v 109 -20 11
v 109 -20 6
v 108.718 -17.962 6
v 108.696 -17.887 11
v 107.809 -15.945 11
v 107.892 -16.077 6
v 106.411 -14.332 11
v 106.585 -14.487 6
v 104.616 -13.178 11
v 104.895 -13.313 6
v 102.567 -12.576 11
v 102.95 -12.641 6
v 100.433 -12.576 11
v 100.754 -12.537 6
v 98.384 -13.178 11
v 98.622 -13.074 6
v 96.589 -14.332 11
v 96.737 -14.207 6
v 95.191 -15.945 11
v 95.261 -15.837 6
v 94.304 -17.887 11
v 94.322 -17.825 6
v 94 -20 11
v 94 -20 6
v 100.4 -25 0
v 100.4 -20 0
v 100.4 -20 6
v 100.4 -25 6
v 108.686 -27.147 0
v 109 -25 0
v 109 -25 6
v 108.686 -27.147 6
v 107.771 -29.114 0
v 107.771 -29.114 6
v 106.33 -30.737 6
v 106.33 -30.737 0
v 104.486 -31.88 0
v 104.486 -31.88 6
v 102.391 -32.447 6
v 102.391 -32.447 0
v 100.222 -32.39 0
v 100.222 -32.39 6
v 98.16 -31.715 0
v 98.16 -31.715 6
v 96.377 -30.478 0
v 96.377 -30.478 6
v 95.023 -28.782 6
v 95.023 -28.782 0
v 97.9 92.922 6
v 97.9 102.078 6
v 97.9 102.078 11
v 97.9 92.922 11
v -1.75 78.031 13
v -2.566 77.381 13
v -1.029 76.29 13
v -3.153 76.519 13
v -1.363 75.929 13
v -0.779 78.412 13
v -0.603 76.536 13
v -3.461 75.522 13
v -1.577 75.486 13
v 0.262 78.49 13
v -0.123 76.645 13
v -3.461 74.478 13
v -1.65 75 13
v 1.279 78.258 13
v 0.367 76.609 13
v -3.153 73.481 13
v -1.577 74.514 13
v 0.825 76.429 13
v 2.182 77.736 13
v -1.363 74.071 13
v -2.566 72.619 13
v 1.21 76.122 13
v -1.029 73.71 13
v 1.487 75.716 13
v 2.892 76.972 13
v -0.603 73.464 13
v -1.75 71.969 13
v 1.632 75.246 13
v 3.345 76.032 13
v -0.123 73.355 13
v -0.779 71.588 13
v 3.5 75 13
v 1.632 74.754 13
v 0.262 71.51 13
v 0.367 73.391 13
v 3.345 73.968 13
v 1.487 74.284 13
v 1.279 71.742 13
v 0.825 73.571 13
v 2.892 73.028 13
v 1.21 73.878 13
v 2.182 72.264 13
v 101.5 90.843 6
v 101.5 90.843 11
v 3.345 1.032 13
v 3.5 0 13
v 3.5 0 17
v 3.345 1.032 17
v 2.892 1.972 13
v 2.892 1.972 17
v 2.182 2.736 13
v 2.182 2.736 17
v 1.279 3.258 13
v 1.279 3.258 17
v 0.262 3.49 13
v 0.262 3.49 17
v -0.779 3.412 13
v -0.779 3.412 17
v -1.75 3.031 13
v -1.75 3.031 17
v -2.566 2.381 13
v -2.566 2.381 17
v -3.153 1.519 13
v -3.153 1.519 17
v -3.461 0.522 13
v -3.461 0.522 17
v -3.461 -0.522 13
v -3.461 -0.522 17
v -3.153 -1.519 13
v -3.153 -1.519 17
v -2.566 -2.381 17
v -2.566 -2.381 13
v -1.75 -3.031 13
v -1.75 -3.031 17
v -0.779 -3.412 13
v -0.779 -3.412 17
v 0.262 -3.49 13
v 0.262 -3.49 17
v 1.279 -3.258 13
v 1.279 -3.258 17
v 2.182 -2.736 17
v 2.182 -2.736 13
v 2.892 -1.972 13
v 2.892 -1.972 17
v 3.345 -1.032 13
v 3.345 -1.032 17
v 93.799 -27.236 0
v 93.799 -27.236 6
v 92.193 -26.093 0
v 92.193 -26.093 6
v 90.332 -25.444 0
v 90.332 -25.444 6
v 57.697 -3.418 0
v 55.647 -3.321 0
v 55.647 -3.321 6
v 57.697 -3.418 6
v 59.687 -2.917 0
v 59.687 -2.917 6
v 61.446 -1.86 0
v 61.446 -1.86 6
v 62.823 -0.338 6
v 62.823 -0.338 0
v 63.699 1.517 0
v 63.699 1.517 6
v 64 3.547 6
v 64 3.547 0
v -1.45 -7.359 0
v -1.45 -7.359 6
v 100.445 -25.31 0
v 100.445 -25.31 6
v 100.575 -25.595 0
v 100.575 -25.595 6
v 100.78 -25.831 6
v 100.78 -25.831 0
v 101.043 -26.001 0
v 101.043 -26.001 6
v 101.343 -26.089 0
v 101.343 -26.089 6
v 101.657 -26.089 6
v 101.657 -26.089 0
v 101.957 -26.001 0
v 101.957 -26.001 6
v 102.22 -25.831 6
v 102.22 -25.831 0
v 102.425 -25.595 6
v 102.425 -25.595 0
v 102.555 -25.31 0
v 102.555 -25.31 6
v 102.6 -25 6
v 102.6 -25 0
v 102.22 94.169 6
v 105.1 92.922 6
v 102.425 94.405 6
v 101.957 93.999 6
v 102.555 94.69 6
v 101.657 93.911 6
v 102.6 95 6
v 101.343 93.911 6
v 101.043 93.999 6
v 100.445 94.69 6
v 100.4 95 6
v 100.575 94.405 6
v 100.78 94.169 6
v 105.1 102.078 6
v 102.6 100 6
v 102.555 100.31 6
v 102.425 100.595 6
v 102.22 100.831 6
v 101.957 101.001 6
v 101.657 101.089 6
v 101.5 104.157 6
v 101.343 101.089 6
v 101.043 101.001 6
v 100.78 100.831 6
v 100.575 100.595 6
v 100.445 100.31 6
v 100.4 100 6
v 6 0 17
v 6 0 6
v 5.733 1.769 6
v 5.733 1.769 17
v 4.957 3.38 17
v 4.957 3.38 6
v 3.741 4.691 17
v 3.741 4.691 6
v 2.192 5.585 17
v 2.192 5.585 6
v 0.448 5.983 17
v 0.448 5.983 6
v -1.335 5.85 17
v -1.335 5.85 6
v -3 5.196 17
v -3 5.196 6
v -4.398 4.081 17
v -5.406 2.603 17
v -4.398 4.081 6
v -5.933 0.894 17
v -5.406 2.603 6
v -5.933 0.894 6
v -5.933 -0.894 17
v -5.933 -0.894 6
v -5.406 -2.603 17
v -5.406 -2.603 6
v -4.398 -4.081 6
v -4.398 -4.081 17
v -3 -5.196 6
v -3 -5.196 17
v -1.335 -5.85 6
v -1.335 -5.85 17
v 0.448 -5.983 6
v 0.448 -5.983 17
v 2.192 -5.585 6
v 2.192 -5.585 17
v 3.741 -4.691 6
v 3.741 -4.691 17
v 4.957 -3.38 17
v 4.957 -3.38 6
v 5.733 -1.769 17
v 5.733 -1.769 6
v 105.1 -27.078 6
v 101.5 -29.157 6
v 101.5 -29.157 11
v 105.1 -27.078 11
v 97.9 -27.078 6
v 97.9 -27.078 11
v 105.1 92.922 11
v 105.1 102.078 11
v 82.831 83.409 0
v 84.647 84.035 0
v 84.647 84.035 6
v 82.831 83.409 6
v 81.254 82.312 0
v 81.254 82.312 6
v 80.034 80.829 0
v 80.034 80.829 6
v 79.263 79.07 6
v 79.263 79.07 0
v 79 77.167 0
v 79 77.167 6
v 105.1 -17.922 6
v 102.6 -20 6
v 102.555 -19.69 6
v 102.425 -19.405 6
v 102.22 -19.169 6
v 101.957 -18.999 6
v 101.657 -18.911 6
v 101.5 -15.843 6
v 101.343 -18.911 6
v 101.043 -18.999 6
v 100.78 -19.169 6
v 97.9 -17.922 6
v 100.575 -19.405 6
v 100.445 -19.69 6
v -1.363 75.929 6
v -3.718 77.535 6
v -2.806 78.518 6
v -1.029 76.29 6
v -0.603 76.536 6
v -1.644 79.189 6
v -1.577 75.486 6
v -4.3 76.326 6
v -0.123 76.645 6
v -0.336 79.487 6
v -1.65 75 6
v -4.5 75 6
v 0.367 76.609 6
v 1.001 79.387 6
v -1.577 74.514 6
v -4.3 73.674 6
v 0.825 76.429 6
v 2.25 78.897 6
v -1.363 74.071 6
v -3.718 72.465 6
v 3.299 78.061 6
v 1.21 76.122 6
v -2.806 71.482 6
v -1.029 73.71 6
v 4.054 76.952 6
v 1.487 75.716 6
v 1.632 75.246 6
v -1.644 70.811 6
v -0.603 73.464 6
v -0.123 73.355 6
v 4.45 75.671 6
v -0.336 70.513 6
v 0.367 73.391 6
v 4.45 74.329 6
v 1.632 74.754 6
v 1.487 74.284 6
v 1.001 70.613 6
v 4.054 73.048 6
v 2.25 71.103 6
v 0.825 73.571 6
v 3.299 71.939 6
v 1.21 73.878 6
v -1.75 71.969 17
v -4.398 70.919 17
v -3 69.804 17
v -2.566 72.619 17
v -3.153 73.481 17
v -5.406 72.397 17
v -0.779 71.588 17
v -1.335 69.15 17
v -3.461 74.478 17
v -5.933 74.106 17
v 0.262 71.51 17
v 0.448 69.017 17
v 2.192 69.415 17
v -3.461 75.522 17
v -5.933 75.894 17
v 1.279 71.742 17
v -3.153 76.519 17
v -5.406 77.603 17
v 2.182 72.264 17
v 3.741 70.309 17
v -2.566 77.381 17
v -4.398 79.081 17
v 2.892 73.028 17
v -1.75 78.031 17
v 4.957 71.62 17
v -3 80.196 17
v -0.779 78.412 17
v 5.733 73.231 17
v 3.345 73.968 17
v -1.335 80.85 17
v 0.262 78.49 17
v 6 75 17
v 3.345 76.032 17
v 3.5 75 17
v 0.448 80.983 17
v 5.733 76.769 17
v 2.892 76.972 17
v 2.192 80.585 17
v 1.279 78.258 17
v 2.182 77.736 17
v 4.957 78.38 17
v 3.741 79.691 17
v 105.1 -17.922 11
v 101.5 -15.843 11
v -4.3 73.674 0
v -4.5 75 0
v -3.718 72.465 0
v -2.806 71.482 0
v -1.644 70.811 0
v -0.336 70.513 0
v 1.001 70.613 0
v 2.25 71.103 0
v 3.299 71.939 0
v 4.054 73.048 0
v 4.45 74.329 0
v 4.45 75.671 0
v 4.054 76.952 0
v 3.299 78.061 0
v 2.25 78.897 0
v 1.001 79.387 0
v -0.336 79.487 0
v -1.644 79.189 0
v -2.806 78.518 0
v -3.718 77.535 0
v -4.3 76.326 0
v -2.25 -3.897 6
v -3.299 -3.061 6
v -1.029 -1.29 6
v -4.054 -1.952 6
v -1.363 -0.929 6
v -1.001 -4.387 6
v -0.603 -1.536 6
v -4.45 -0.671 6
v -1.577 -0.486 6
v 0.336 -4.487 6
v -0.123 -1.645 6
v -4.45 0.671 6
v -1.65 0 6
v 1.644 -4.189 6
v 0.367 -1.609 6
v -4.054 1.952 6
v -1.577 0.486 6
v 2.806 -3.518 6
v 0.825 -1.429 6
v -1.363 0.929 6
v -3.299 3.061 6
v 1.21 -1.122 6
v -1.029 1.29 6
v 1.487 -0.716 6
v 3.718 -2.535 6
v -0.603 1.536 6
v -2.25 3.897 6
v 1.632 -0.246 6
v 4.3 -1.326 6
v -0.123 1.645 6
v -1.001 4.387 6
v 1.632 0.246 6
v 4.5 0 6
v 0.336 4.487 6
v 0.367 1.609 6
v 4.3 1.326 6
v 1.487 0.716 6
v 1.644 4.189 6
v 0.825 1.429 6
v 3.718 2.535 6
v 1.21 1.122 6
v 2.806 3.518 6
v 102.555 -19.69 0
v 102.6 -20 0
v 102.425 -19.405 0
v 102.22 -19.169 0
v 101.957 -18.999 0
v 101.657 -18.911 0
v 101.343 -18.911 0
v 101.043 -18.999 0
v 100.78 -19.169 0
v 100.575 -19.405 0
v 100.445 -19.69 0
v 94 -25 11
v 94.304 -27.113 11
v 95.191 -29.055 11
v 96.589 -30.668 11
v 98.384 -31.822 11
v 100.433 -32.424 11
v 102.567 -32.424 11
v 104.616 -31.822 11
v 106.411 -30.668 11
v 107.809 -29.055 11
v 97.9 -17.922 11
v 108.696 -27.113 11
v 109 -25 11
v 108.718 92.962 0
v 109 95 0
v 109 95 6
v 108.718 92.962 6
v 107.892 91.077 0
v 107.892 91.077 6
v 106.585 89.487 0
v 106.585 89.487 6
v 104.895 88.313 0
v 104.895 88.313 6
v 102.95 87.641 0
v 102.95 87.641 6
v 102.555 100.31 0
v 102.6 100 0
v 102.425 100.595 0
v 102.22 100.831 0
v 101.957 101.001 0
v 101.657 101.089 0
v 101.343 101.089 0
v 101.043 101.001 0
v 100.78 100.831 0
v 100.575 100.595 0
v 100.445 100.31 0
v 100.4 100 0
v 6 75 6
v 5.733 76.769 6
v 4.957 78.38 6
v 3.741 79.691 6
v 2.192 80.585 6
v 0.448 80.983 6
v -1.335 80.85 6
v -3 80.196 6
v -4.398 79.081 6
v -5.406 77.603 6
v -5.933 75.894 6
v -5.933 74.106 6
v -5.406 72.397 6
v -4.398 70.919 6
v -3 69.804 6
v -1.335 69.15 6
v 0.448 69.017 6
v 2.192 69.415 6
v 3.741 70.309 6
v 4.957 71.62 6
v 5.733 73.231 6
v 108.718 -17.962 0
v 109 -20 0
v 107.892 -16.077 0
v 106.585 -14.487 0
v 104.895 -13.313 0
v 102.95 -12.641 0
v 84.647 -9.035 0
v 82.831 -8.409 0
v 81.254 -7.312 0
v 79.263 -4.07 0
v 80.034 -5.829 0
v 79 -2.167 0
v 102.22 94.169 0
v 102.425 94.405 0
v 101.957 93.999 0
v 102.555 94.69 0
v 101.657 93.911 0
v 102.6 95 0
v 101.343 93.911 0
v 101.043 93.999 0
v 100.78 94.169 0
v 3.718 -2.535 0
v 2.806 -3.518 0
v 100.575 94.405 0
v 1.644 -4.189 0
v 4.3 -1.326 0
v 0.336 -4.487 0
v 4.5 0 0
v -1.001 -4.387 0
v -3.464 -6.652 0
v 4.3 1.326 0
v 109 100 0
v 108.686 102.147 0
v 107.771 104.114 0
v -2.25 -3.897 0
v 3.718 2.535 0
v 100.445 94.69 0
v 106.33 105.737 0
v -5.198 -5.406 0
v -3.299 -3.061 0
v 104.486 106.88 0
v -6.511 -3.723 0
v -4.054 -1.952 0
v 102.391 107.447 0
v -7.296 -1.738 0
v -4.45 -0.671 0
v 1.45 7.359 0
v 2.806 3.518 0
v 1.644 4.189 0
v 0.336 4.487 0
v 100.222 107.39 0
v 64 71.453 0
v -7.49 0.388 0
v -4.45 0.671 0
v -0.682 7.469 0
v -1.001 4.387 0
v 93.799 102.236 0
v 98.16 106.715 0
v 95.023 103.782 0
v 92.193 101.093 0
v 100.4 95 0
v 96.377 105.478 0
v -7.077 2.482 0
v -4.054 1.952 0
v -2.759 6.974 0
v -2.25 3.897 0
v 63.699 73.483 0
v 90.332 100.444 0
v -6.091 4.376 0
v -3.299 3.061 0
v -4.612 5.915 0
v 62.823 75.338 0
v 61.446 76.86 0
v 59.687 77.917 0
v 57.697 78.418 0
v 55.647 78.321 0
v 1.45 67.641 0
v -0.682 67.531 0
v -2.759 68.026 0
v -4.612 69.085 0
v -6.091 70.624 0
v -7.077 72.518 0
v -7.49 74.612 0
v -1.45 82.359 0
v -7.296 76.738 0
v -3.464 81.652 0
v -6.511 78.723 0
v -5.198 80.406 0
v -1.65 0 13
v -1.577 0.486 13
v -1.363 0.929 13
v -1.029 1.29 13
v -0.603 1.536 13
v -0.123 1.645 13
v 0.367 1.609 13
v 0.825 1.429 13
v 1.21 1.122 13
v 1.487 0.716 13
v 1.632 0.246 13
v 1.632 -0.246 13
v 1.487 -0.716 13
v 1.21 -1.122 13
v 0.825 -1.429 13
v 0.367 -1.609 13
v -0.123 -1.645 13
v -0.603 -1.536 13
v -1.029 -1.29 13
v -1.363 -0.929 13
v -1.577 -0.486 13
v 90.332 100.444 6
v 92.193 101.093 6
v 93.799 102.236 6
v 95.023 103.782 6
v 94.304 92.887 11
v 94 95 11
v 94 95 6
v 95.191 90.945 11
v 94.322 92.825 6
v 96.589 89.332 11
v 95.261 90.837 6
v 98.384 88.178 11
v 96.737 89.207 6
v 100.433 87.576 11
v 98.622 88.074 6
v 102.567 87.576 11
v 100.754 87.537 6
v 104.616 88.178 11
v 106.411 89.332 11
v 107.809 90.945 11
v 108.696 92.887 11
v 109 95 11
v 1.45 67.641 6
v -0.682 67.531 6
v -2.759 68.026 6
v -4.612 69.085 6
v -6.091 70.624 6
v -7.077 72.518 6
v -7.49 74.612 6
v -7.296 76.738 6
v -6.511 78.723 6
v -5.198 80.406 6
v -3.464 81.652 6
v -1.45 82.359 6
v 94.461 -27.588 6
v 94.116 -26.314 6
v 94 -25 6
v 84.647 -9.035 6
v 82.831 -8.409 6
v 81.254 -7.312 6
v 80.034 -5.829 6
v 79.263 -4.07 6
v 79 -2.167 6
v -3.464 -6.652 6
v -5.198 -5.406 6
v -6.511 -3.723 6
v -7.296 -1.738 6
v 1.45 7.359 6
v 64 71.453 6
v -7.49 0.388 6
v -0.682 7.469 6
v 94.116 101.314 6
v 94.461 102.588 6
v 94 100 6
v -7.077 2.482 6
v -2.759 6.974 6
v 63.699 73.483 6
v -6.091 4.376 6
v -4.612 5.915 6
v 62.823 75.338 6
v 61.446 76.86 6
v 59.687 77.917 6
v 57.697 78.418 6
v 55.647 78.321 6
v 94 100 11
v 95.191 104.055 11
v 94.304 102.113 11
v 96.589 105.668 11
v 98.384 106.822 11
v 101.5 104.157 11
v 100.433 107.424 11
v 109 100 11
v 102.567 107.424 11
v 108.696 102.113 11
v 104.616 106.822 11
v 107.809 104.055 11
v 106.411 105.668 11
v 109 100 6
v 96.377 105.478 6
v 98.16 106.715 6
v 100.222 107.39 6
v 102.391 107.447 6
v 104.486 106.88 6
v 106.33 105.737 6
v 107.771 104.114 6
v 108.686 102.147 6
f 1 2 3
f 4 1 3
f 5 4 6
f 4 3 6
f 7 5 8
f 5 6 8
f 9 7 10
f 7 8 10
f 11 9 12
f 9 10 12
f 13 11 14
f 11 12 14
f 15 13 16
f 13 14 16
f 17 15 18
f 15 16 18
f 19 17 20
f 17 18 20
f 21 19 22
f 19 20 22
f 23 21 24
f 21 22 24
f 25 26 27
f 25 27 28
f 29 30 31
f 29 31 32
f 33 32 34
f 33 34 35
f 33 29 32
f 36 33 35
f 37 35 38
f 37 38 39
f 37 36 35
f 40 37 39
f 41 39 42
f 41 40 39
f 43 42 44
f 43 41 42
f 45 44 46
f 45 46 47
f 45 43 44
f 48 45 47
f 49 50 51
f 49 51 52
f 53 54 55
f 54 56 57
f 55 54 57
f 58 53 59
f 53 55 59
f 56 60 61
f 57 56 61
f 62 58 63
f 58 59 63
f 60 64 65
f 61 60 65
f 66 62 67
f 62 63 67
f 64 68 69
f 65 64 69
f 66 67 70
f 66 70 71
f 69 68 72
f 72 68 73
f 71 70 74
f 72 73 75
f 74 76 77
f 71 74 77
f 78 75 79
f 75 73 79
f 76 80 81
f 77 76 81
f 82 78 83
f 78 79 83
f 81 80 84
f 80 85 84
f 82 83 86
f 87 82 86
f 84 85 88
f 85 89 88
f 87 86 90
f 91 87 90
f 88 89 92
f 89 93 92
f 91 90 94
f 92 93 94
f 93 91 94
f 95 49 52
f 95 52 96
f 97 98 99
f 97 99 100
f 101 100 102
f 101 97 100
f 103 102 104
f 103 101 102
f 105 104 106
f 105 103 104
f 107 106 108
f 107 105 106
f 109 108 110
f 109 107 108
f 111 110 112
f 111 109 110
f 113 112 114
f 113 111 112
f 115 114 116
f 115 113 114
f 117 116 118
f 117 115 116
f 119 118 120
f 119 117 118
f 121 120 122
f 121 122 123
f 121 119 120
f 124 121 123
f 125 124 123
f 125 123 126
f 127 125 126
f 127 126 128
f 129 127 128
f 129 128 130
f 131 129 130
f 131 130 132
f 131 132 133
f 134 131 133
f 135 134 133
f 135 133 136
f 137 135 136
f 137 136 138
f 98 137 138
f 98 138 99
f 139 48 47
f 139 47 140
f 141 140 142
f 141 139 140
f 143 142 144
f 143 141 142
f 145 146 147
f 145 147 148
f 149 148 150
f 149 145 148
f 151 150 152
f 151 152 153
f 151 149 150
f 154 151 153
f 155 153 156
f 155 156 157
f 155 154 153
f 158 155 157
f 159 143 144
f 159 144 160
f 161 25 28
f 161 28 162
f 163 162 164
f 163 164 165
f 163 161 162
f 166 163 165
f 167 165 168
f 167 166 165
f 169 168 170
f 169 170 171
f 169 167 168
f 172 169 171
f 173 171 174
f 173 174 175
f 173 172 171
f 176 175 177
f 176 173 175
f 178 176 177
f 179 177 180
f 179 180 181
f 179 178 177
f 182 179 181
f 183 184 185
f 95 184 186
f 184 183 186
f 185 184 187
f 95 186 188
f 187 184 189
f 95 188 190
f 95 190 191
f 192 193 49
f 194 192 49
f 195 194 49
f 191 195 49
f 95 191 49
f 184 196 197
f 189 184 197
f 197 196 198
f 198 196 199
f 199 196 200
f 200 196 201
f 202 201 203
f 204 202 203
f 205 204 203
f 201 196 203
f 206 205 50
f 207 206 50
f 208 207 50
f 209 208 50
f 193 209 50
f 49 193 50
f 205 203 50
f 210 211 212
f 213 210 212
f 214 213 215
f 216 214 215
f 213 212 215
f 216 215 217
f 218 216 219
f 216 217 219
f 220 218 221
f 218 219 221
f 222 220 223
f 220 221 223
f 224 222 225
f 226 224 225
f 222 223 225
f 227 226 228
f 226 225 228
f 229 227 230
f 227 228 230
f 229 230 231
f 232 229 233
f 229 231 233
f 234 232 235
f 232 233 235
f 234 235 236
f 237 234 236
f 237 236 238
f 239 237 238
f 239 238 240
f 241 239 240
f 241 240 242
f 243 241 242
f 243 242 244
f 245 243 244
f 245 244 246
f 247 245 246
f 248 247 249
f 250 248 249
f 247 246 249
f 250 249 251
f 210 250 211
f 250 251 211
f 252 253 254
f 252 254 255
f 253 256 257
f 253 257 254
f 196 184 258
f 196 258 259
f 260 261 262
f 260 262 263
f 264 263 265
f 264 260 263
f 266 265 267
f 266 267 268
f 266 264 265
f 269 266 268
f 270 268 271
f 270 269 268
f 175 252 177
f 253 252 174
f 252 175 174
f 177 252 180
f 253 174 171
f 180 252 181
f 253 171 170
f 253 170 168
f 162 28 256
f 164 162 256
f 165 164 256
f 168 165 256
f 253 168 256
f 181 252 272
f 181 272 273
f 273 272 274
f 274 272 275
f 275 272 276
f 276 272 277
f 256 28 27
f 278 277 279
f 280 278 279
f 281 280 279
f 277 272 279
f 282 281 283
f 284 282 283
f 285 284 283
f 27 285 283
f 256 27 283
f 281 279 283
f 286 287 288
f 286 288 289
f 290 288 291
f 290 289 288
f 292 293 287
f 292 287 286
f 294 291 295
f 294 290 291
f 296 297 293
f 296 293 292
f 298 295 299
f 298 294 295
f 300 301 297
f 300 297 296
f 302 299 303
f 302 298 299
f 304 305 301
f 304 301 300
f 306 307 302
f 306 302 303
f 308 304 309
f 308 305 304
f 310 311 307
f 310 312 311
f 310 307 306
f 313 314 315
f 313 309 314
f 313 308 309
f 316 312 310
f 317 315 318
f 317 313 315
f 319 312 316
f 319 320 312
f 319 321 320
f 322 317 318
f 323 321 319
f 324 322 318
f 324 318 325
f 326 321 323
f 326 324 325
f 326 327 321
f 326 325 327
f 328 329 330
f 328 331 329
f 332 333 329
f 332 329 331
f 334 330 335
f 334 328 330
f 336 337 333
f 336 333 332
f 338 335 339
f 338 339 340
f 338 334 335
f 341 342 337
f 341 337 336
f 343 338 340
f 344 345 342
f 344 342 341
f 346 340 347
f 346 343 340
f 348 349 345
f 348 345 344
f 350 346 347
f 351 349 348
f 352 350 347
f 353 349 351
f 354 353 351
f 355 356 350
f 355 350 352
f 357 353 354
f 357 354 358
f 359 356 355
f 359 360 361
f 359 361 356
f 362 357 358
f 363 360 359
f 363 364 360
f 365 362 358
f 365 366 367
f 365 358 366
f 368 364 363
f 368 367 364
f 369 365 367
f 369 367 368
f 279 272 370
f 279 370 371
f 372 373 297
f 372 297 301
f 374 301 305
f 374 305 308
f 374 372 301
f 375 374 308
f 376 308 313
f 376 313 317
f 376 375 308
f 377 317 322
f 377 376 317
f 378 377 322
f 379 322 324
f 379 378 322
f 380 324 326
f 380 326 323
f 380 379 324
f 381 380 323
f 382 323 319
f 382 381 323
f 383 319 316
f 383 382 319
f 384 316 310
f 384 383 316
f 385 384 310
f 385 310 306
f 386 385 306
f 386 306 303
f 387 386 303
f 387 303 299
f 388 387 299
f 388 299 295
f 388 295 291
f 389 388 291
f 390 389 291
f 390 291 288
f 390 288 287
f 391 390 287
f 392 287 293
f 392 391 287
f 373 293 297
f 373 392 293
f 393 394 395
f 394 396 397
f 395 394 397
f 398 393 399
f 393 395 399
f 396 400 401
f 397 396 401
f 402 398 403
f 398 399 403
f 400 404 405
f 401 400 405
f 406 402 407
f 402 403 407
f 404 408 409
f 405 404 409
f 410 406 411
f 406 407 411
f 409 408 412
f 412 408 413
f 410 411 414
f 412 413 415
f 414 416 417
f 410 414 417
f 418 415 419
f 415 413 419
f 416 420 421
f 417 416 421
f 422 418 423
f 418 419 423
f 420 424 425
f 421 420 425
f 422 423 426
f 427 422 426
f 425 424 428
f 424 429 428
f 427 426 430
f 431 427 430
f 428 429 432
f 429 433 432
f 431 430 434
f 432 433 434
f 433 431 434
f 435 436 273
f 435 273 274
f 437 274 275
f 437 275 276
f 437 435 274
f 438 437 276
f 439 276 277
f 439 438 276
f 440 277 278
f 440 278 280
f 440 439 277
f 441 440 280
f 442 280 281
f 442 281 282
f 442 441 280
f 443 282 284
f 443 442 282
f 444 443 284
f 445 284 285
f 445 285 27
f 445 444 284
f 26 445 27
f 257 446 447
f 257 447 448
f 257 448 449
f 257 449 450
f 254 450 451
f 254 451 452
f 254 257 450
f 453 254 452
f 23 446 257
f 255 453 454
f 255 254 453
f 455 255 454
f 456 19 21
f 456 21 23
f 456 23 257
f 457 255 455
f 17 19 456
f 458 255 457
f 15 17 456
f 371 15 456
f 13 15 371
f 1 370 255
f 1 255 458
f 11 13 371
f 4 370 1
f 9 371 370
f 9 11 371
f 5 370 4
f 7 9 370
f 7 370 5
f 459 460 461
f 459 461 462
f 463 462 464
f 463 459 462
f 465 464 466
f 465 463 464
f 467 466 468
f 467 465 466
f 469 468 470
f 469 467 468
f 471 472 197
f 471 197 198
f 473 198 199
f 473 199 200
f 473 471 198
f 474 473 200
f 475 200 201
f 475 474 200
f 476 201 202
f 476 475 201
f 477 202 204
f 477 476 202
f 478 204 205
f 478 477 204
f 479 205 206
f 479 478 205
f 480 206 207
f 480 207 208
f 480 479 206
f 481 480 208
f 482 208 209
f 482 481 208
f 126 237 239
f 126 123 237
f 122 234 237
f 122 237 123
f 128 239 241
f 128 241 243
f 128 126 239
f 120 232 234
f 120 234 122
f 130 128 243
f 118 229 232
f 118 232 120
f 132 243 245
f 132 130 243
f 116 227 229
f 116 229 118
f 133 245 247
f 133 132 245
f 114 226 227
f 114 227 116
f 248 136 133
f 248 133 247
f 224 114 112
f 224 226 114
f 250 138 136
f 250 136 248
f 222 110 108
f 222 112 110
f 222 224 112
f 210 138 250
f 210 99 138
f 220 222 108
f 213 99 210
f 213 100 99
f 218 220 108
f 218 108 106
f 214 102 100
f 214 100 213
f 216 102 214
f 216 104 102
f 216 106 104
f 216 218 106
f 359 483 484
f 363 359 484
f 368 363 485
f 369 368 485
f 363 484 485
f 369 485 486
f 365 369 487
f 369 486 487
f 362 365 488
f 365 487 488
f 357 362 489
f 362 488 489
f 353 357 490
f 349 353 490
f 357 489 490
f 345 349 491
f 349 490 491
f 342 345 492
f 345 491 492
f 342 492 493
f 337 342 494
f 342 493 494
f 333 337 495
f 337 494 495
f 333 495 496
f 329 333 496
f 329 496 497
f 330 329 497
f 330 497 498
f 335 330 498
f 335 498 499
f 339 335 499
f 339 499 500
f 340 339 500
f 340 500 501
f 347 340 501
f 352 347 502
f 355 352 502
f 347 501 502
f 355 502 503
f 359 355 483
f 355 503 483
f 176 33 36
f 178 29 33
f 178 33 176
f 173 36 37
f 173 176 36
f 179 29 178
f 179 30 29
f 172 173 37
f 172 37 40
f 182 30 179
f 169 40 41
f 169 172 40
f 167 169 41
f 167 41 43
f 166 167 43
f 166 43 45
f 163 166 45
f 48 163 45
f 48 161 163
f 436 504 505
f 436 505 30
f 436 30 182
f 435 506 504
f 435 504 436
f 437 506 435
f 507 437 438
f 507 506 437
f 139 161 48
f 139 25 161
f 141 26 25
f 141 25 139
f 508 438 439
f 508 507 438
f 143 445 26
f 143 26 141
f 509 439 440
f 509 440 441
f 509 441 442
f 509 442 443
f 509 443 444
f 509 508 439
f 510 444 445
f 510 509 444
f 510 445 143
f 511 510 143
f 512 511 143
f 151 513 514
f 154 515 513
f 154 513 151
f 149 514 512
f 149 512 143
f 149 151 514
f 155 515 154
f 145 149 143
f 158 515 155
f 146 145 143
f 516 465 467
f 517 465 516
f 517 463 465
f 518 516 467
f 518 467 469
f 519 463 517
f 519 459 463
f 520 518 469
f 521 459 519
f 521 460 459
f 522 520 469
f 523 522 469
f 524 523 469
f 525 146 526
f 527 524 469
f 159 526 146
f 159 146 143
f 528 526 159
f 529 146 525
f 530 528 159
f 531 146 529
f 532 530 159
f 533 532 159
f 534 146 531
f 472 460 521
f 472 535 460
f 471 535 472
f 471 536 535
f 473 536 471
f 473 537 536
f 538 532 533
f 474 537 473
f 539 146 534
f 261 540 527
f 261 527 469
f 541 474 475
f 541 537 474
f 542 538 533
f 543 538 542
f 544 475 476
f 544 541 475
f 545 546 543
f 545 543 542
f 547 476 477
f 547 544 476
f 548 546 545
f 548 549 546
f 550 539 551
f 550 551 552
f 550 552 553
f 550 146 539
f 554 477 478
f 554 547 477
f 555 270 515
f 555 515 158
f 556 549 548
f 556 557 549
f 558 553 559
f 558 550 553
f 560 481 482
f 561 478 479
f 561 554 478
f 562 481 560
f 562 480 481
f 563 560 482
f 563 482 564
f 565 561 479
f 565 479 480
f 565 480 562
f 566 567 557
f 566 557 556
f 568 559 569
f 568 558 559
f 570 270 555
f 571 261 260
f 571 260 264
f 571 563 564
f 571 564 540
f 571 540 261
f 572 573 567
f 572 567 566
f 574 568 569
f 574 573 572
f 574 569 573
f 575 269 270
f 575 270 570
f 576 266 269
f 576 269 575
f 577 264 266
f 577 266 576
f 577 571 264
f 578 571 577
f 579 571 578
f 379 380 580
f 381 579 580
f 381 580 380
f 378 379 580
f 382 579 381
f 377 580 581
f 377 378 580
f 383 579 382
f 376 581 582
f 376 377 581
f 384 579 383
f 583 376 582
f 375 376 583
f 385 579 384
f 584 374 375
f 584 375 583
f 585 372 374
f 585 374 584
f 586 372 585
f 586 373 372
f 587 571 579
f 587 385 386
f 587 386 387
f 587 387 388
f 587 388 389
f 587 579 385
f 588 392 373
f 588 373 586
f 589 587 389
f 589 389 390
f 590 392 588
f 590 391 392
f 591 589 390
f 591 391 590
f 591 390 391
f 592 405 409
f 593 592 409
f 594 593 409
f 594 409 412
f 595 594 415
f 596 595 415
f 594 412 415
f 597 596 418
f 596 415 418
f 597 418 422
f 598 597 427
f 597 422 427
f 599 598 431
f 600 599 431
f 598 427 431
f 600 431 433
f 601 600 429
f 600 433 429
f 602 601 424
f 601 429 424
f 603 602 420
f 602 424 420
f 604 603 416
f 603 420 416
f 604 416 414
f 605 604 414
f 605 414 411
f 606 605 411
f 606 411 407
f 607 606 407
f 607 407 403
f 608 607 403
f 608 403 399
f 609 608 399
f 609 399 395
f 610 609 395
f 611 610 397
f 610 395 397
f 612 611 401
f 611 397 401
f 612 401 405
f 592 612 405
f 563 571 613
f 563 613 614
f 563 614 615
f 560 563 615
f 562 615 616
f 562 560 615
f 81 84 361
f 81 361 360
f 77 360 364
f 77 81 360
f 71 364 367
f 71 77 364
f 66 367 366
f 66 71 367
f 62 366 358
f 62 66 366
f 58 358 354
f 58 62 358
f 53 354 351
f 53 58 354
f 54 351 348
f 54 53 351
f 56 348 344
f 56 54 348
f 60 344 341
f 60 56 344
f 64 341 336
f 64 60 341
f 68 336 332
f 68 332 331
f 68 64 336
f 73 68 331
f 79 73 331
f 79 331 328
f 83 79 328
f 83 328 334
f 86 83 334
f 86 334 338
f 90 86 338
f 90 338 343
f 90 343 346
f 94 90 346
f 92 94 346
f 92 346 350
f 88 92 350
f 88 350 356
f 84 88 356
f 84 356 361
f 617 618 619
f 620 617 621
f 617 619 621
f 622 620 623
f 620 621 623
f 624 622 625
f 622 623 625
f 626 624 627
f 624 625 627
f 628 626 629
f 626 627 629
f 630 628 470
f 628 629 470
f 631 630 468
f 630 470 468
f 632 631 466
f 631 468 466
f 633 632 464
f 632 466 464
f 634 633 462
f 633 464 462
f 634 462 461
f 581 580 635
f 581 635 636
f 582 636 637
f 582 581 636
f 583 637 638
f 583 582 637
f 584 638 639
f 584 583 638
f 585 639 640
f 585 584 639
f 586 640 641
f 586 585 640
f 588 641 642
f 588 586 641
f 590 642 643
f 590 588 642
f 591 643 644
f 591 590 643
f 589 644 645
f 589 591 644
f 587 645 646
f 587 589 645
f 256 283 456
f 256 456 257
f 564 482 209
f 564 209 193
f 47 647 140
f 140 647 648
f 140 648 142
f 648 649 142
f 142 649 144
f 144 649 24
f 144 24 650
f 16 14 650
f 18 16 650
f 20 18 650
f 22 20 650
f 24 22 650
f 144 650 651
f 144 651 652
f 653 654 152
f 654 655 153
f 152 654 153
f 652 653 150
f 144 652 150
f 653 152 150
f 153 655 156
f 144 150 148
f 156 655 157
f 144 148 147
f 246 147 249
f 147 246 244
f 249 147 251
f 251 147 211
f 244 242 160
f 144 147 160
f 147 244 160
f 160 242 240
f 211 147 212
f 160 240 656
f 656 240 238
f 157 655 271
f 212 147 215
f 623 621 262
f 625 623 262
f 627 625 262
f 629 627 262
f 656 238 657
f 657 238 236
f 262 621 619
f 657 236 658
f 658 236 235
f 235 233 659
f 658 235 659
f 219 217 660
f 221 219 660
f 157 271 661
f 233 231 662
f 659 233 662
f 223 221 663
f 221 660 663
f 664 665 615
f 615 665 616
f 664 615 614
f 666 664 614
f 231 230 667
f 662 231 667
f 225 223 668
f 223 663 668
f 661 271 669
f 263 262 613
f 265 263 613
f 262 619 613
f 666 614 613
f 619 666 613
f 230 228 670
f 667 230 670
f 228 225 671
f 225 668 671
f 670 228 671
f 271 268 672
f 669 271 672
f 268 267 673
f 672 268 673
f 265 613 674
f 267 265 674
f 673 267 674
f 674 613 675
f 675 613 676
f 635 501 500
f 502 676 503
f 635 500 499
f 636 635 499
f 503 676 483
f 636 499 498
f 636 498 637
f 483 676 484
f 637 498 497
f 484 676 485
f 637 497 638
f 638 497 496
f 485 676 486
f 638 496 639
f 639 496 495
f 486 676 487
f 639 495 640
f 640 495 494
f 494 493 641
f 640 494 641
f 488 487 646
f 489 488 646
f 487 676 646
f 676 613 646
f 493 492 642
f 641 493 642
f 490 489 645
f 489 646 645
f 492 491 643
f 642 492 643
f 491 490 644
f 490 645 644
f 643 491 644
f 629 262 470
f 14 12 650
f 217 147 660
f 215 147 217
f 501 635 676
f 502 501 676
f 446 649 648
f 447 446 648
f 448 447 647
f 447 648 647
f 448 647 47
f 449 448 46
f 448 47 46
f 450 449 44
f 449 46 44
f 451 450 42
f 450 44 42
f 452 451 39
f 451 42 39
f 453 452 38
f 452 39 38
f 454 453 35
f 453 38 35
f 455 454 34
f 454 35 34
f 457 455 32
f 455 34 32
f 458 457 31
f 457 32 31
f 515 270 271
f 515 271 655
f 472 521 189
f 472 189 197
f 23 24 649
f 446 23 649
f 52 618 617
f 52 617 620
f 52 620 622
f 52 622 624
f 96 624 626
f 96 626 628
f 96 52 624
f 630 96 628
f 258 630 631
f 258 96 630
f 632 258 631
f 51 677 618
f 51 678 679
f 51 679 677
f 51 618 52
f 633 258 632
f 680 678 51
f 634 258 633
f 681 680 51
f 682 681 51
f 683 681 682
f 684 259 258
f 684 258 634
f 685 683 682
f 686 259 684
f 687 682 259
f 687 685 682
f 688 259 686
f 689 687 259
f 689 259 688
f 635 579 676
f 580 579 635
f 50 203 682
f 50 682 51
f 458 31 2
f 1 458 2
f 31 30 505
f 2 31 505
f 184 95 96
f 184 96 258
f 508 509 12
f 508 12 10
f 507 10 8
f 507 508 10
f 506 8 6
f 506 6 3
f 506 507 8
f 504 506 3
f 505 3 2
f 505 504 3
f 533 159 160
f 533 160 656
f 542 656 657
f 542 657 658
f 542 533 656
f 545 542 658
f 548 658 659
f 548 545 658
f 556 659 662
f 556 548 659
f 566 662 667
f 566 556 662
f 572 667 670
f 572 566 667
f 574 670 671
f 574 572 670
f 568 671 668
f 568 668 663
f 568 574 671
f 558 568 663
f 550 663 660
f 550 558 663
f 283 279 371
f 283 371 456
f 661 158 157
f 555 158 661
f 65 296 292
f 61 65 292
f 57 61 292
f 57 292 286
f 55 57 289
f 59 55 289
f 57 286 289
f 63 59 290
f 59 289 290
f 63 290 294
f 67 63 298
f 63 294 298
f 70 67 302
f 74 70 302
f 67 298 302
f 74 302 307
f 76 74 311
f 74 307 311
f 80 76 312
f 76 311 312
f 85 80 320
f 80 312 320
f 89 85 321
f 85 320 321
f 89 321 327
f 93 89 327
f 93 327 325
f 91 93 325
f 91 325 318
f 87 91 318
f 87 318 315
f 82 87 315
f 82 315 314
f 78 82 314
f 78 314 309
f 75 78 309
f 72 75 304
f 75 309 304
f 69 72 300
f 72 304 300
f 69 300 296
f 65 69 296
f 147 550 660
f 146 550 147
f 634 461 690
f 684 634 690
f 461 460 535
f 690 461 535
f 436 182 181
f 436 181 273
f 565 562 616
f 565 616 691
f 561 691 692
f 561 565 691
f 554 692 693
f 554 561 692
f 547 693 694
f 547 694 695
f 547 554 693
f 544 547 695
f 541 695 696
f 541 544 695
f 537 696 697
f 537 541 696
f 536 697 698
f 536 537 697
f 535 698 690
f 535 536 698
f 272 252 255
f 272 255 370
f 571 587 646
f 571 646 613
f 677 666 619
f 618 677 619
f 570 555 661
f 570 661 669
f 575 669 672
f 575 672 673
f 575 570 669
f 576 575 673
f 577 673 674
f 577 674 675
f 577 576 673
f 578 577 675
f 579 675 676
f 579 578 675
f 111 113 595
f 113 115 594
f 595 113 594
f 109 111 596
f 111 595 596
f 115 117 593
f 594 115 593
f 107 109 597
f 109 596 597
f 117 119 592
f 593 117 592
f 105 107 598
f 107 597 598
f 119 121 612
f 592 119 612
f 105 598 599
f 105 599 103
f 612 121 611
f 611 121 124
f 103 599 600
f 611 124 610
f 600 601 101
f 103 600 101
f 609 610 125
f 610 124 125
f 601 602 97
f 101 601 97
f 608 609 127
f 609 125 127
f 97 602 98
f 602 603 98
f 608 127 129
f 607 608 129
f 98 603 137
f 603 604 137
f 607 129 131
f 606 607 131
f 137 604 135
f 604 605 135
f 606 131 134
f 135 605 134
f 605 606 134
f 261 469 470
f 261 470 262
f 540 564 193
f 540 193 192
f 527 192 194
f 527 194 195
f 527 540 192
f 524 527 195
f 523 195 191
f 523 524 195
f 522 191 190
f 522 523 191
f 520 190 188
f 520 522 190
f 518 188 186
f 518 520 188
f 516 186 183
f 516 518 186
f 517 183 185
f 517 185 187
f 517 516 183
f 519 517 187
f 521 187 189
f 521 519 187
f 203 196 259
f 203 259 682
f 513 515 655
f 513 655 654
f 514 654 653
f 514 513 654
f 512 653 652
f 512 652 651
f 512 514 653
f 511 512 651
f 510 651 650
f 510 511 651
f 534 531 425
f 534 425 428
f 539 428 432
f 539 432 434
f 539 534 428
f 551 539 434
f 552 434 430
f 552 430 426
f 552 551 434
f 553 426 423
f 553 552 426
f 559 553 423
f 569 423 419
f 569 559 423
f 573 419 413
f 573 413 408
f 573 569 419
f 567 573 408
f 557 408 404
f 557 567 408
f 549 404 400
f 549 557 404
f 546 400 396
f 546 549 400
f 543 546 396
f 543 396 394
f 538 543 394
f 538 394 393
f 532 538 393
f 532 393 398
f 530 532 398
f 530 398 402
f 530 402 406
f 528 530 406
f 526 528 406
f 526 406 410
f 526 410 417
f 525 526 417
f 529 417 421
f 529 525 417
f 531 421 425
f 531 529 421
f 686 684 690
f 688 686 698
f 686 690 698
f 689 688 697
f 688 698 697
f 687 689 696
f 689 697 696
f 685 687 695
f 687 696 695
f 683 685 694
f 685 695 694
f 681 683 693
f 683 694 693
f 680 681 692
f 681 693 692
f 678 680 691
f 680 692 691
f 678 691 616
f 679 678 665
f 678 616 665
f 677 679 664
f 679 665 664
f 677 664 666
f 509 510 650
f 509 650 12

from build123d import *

# Parameters (mm, degrees)
SKETCH1_R           = 4.5
BOSS_EXTRUDE1_DEPTH = 6
SKETCH2_R           = 6
SKETCH2_R_2         = 3.5
BOSS_EXTRUDE2_DEPTH = 11
BOSS_EXTRUDE3_START = -6
SKETCH3_R           = 3.5
SKETCH3_R_2         = 1.65
BOSS_EXTRUDE3_DEPTH = 7
BOSS_EXTRUDE4_DEPTH = 5


with BuildPart() as part:
    # Sketch1 → Boss-Extrude1 (new body)
    with BuildSketch(Plane.XY):
        with BuildLine():
            Line((102.949952293, 87.641492111), (84.646703629, 84.03494065))
            ThreePointArc((84.646703629, 84.03494065), (80.592912741, 81.612614555), (78.999992436, 77.166999954))
            Line((78.999992436, 77.166999954), (78.999992436, -2.166999954))
            ThreePointArc((78.999992436, -2.166999954), (80.592912741, -6.612614555), (84.646703629, -9.03494065))
            Line((84.646703629, -9.03494065), (102.949952293, -12.641492111))
            ThreePointArc((102.949952293, -12.641492111), (107.293299673, -15.2368415), (109, -20))
            Line((109, -20), (109, -25))
            ThreePointArc((109, -25), (103.458898596, -32.239662719), (95.023275656, -28.781804036))
            ThreePointArc((95.023275656, -28.781804036), (93.036589613, -26.607931656), (90.331621742, -25.443547107))
            Line((90.331621742, -25.443547107), (-1.449952293, -7.358507889))
            ThreePointArc((-1.449952293, -7.358507889), (-7.358507889, 1.449952293), (1.449952293, 7.358507889))
            Line((1.449952293, 7.358507889), (55.646703629, -3.320654936))
            ThreePointArc((55.646703629, -3.320654936), (61.445607037, -1.859793935), (63.999992436, 3.54728576))
            Line((63.999992436, 3.54728576), (63.999992436, 71.45271424))
            ThreePointArc((63.999992436, 71.45271424), (61.445607037, 76.859793935), (55.646703629, 78.320654936))
            Line((55.646703629, 78.320654936), (1.449952293, 67.641492111))
            ThreePointArc((1.449952293, 67.641492111), (-7.358507889, 73.550047707), (-1.449952293, 82.358507889))
            Line((-1.449952293, 82.358507889), (90.331621742, 100.443547107))
            ThreePointArc((90.331621742, 100.443547107), (93.036589613, 101.607931655), (95.023275656, 103.781804036))
            ThreePointArc((95.023275656, 103.781804036), (103.458898596, 107.239662719), (109, 100))
            Line((109, 100), (109, 95))
            ThreePointArc((109, 95), (107.293299673, 90.2368415), (102.949952293, 87.641492111))
        make_face()
        Circle(SKETCH1_R, mode=Mode.SUBTRACT)
        with Locations(Location((0, 75, 0), (0, 0, 180))):
            Circle(SKETCH1_R, mode=Mode.SUBTRACT)
        with BuildLine():
            Line((102.6, -25), (102.6, -20))
            ThreePointArc((102.6, -20), (101.5, -18.9), (100.4, -20))
            Line((100.4, -20), (100.4, -25))
            ThreePointArc((100.4, -25), (101.5, -26.1), (102.6, -25))
        make_face(mode=Mode.SUBTRACT)
        with BuildLine():
            Line((100.4, 100), (100.4, 95))
            ThreePointArc((100.4, 95), (101.5, 93.9), (102.6, 95))
            Line((102.6, 95), (102.6, 100))
            ThreePointArc((102.6, 100), (101.5, 101.1), (100.4, 100))
        make_face(mode=Mode.SUBTRACT)
    extrude(amount=BOSS_EXTRUDE1_DEPTH)

    # Sketch2 → Boss-Extrude2 (add)
    # profile 1 of 2: a face of its own
    with BuildSketch(Plane.XY.offset(6)):
        with Locations((0, 75)):
            Circle(SKETCH2_R)
        with Locations((0, 75)):
            Circle(SKETCH2_R_2, mode=Mode.SUBTRACT)
    # profile 2 of 2: a face of its own
    with BuildSketch(Plane.XY.offset(6)):
        Circle(SKETCH2_R)
        Circle(SKETCH2_R_2, mode=Mode.SUBTRACT)
    extrude(amount=BOSS_EXTRUDE2_DEPTH)

    # Sketch3 → Boss-Extrude3 (add)
    # profile 1 of 2: a face of its own
    with BuildSketch(Plane(origin=(0, 0, 0), x_dir=(-1, 0, 0), z_dir=(0, 0, -1)).offset(BOSS_EXTRUDE3_START)):
        with Locations(Location((0, 75, 0), (0, 0, 180))):
            Circle(SKETCH3_R)
        with Locations((0, 75)):
            Circle(SKETCH3_R_2, mode=Mode.SUBTRACT)
    # profile 2 of 2: a face of its own
    with BuildSketch(Plane(origin=(0, 0, 0), x_dir=(-1, 0, 0), z_dir=(0, 0, -1)).offset(BOSS_EXTRUDE3_START)):
        with Locations(Location((0, 0, 0), (0, 0, 180))):
            Circle(SKETCH3_R)
        Circle(SKETCH3_R_2, mode=Mode.SUBTRACT)
    extrude(amount=-BOSS_EXTRUDE3_DEPTH)

    # Sketch4 → Boss-Extrude4 (add)
    # profile 1 of 2: a face of its own
    with BuildSketch(Plane.XY.offset(6)):
        with BuildLine():
            Line((94, -20), (94, -25))
            ThreePointArc((94, -25), (101.5, -32.5), (109, -25))
            Line((109, -25), (109, -20))
            ThreePointArc((109, -20), (101.5, -12.5), (94, -20))
        make_face()
        Polygon((101.5, -15.843078062), (97.9, -17.921539031), (97.9, -27.078460969), (101.5, -29.156921938), (105.1, -27.078460969), (105.1, -17.921539031), align=None, mode=Mode.SUBTRACT)
    # profile 2 of 2: a face of its own
    with BuildSketch(Plane.XY.offset(6)):
        with BuildLine():
            Line((94, 100), (94, 95))
            ThreePointArc((94, 95), (101.5, 87.5), (109, 95))
            Line((109, 95), (109, 100))
            ThreePointArc((109, 100), (101.5, 107.5), (94, 100))
        make_face()
        Polygon((101.5, 104.156921938), (97.9, 102.078460969), (97.9, 92.921539031), (101.5, 90.843078062), (105.1, 92.921539031), (105.1, 102.078460969), align=None, mode=Mode.SUBTRACT)
    extrude(amount=BOSS_EXTRUDE4_DEPTH)


solid = part.part
